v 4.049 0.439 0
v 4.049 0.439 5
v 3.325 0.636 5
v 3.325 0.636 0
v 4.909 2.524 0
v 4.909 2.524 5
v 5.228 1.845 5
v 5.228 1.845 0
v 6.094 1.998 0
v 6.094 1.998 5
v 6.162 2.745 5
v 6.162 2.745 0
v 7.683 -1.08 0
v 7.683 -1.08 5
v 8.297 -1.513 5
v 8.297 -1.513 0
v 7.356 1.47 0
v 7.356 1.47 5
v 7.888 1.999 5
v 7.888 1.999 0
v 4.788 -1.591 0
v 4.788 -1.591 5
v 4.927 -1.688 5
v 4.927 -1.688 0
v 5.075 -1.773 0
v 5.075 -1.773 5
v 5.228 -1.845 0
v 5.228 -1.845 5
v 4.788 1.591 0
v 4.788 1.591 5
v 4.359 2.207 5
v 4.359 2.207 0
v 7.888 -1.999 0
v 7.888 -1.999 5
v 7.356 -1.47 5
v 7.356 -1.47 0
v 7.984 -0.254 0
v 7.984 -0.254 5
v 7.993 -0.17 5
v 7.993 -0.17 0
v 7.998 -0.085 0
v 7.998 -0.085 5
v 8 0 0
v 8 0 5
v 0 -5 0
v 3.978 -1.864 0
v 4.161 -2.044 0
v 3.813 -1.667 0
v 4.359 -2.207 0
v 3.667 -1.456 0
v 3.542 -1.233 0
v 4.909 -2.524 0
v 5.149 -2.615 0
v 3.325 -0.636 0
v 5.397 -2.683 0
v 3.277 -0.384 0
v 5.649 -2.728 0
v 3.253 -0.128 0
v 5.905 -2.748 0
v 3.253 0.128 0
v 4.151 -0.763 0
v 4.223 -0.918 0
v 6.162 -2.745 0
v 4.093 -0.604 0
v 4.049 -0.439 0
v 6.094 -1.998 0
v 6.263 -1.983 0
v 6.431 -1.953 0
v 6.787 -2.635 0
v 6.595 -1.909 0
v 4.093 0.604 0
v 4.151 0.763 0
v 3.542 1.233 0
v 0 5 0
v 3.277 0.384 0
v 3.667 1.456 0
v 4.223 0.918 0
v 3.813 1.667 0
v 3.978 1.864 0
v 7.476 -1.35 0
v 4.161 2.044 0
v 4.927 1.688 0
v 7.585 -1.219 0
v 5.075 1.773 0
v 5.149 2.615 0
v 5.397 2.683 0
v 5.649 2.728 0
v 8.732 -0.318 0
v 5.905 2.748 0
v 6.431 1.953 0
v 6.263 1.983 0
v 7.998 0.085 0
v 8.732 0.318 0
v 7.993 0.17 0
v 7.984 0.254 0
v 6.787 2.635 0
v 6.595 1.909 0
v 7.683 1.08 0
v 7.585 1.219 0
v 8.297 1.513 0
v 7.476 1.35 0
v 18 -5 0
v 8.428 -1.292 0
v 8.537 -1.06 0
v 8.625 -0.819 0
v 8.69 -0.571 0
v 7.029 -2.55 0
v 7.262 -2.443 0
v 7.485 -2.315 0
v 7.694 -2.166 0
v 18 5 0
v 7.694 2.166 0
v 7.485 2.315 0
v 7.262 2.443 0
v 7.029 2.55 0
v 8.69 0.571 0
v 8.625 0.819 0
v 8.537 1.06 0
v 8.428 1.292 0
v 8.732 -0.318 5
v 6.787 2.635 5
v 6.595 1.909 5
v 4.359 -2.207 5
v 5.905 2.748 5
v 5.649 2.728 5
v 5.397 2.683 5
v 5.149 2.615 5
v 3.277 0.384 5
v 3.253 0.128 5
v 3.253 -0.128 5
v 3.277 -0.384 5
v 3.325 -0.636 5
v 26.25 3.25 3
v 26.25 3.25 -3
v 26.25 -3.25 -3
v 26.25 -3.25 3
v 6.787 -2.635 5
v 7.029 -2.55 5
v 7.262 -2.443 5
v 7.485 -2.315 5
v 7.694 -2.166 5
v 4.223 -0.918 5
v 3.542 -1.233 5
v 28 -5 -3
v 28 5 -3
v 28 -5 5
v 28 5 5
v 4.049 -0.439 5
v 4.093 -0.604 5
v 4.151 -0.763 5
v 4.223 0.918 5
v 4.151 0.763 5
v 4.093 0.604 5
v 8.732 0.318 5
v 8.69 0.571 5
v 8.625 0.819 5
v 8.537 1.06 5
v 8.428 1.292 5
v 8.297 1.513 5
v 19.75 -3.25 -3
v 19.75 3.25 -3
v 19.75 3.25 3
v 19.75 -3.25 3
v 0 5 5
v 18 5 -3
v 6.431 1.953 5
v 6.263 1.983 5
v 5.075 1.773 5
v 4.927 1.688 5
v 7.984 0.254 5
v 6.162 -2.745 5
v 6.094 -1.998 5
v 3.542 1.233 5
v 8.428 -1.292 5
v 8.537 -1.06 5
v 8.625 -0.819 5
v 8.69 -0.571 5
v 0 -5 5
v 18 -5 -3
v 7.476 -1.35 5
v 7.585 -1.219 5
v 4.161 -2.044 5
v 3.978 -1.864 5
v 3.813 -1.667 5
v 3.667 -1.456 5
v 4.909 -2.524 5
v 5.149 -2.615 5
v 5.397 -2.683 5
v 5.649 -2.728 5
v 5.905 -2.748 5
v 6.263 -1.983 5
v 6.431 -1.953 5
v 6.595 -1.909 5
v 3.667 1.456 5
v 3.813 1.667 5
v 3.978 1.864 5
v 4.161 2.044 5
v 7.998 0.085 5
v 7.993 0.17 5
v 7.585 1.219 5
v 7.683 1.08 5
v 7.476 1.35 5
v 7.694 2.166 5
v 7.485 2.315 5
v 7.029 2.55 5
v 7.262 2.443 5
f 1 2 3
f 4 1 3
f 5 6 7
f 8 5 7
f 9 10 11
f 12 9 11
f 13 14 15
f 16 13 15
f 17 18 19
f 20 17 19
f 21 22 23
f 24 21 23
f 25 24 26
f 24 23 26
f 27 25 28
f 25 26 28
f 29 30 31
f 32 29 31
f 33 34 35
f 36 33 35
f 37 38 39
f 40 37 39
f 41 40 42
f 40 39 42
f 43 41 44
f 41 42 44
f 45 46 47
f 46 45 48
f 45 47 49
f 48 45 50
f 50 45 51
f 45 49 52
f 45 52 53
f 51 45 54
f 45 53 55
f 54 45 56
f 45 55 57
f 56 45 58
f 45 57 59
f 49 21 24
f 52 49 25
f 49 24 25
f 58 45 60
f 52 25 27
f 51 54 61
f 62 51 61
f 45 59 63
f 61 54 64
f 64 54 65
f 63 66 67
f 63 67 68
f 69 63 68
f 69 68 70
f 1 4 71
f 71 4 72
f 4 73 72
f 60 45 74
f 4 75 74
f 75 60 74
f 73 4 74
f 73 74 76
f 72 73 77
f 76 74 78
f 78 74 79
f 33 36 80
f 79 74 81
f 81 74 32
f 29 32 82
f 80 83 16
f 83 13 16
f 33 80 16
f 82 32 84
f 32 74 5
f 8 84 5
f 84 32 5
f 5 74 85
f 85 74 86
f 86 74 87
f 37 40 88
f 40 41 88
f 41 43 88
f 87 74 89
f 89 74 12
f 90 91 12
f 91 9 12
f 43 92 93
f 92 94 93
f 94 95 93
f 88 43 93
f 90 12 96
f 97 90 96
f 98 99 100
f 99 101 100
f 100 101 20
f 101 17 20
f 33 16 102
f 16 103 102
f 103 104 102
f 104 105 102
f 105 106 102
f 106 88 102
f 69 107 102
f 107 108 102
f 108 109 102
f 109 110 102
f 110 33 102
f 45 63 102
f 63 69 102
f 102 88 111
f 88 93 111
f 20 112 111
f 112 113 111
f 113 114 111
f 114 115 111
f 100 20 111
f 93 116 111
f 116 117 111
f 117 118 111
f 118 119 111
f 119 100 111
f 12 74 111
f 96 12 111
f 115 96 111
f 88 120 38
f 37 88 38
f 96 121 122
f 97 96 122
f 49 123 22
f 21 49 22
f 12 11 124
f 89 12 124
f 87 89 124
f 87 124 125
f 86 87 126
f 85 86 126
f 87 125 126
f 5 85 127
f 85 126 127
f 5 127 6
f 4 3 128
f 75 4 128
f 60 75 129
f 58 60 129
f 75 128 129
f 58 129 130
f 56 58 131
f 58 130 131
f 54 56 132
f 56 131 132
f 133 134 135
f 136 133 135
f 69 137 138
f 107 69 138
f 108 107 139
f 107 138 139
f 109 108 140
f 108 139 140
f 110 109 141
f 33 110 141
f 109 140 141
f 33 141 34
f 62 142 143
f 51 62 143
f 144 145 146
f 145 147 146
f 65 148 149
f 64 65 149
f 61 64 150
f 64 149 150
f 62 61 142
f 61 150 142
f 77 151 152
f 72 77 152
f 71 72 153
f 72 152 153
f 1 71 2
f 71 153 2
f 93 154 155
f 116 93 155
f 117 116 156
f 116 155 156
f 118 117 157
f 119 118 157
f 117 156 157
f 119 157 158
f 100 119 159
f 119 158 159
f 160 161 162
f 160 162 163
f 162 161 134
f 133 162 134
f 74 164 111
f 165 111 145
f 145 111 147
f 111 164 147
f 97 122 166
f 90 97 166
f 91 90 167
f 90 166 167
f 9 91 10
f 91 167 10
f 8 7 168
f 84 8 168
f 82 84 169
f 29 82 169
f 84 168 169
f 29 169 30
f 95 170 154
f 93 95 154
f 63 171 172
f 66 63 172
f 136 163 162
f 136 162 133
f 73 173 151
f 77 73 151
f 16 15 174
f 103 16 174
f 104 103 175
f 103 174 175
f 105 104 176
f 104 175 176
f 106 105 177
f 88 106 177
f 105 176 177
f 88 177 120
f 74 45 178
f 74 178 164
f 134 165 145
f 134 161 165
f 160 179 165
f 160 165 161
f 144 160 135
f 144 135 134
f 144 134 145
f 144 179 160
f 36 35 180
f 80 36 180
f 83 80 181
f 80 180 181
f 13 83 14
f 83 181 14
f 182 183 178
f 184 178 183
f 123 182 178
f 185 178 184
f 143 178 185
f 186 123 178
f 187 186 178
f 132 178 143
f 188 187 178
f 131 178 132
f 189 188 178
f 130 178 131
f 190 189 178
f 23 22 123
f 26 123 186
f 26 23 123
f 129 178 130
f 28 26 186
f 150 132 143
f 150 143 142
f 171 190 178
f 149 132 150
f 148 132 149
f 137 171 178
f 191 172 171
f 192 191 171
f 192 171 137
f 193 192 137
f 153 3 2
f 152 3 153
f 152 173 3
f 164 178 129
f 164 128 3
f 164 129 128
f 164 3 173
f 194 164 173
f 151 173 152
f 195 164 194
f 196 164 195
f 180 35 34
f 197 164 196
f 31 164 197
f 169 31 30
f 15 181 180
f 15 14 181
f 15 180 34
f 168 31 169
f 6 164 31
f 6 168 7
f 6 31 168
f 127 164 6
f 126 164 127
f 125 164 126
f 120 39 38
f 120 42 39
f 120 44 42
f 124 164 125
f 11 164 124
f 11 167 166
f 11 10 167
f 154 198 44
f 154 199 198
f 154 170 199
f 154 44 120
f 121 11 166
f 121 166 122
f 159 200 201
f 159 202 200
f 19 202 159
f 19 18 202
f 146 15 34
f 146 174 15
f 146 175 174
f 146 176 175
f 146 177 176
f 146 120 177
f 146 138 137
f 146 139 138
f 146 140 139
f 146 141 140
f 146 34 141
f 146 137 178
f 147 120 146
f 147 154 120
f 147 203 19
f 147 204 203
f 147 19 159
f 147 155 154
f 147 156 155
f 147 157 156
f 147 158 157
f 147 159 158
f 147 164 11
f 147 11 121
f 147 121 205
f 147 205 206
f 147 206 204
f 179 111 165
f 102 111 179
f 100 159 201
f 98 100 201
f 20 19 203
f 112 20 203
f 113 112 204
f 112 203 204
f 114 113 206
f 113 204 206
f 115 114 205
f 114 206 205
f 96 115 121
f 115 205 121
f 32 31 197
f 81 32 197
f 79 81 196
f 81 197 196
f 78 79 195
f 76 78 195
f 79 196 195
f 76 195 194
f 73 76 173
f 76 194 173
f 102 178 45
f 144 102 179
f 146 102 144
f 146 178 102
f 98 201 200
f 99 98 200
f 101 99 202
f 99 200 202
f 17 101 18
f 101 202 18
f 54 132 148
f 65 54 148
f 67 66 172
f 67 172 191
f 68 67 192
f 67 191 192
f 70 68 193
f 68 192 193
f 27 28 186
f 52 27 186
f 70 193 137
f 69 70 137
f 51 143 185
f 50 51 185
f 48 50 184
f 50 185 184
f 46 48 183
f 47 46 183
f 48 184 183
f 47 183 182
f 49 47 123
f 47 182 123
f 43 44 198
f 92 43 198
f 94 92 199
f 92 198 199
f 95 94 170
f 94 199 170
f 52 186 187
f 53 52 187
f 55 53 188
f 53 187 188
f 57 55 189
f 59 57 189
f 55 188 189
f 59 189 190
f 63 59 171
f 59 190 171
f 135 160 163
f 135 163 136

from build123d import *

# Parameters (mm, degrees)
F0_W     = 28
F0_H     = 10
F1_DEPTH = 5
F3_DEPTH = 6
F4_W     = 10
F4_H     = 10
F5_DEPTH = 3
F6_W     = 6.5
F6_H     = 6.5
F7_DEPTH = 6


with BuildPart() as f1:
    # F0 (on Top) → F1 (new body)
    with BuildSketch(Plane.XY):
        with Locations((14, 0)):
            Rectangle(F0_W, F0_H)
    extrude(amount=F1_DEPTH)

    # F2 (on face) → F3 (cut)
    with BuildSketch(Plane.XY.offset(5)):
        with BuildLine():
            Line((7.9837568295, 0.2543793255), (8.7316052217, 0.3175419863))
            ThreePointArc((8.7316052217, 0.3175419863), (8.5841547072, 0.9405553941), (8.2966430552, 1.512590717))
            Line((8.2966430552, 1.512590717), (7.6831577744, 1.0802684419))
            ThreePointArc((7.6831577744, 1.0802684419), (7.8793852416, 0.6840402867), (7.9837568295, 0.2543793255))
        make_face()
        with BuildLine():
            Line((7.9837568295, -0.2543793255), (7.9837568295, 0.2543793255))
            ThreePointArc((7.9837568295, 0.2543793255), (7.8793852416, 0.6840402867), (7.6831577744, 1.0802684419))
            Line((7.6831577744, 1.0802684419), (7.3561340172, 1.4700001794))
            ThreePointArc((7.3561340172, 1.4700001794), (7, 1.7320508076), (6.5949904904, 1.9094465995))
            Line((6.5949904904, 1.9094465995), (6.0939610264, 1.9977916121))
            ThreePointArc((6.0939610264, 1.9977916121), (5.6527036447, 1.969615506), (5.2284205433, 1.8451734721))
            Line((5.2284205433, 1.8451734721), (4.7878226271, 1.5907941466))
            ThreePointArc((4.7878226271, 1.5907941466), (4.4679111138, 1.2855752194), (4.2228811992, 0.9175231702))
            Line((4.2228811992, 0.9175231702), (4.0488754925, 0.4394464201))
            ThreePointArc((4.0488754925, 0.4394464201), (4, 0), (4.0488754925, -0.4394464201))
            Line((4.0488754925, -0.4394464201), (4.2228811992, -0.9175231702))
            ThreePointArc((4.2228811992, -0.9175231702), (4.4679111138, -1.2855752194), (4.7878226271, -1.5907941466))
            Line((4.7878226271, -1.5907941466), (5.2284205433, -1.8451734721))
            ThreePointArc((5.2284205433, -1.8451734721), (5.6527036447, -1.969615506), (6.0939610264, -1.9977916121))
            Line((6.0939610264, -1.9977916121), (6.5949904904, -1.9094465995))
            ThreePointArc((6.5949904904, -1.9094465995), (7, -1.7320508076), (7.3561340172, -1.4700001794))
            Line((7.3561340172, -1.4700001794), (7.6831577744, -1.0802684419))
            ThreePointArc((7.6831577744, -1.0802684419), (7.8793852416, -0.6840402867), (7.9837568295, -0.2543793255))
        make_face()
        with BuildLine():
            ThreePointArc((8, 0), (7.9959350765, 0.1274486974), (7.9837568295, 0.2543793255))
            Line((7.9837568295, 0.2543793255), (7.9837568295, -0.2543793255))
            ThreePointArc((7.9837568295, -0.2543793255), (7.9959350765, -0.1274486974), (8, 0))
        make_face()
        with BuildLine():
            Line((7.3561340172, 1.4700001794), (7.6831577744, 1.0802684419))
            ThreePointArc((7.6831577744, 1.0802684419), (7.5320888862, 1.2855752194), (7.3561340172, 1.4700001794))
        make_face()
        with BuildLine():
            Line((8.7316052217, -0.3175419863), (7.9837568295, -0.2543793255))
            ThreePointArc((7.9837568295, -0.2543793255), (7.8793852416, -0.6840402867), (7.6831577744, -1.0802684419))
            Line((7.6831577744, -1.0802684419), (8.2966430552, -1.512590717))
            ThreePointArc((8.2966430552, -1.512590717), (8.5841547072, -0.9405553941), (8.7316052217, -0.3175419863))
        make_face()
        with BuildLine():
            ThreePointArc((6.5949904904, 1.9094465995), (7, 1.7320508076), (7.3561340172, 1.4700001794))
            Line((7.3561340172, 1.4700001794), (7.8884189465, 1.9990932651))
            ThreePointArc((7.8884189465, 1.9990932651), (7.375, 2.3815698604), (6.7870560788, 2.6349654132))
            Line((6.7870560788, 2.6349654132), (6.5949904904, 1.9094465995))
        make_face()
        with BuildLine():
            ThreePointArc((7.3561340172, -1.4700001794), (7.5320888862, -1.2855752194), (7.6831577744, -1.0802684419))
            Line((7.6831577744, -1.0802684419), (7.3561340172, -1.4700001794))
        make_face()
        with BuildLine():
            Line((6.0939610264, 1.9977916121), (6.5949904904, 1.9094465995))
            ThreePointArc((6.5949904904, 1.9094465995), (6.3472963553, 1.969615506), (6.0939610264, 1.9977916121))
        make_face()
        with BuildLine():
            Line((7.8884189465, -1.9990932651), (7.3561340172, -1.4700001794))
            ThreePointArc((7.3561340172, -1.4700001794), (7, -1.7320508076), (6.5949904904, -1.9094465995))
            Line((6.5949904904, -1.9094465995), (6.7870560788, -2.6349654132))
            ThreePointArc((6.7870560788, -2.6349654132), (7.375, -2.3815698604), (7.8884189465, -1.9990932651))
        make_face()
        with BuildLine():
            ThreePointArc((5.2284205433, 1.8451734721), (5.6527036447, 1.969615506), (6.0939610264, 1.9977916121))
            Line((6.0939610264, 1.9977916121), (6.1616204589, 2.7452465877))
            ThreePointArc((6.1616204589, 2.7452465877), (5.5224675114, 2.7082213208), (4.9091968161, 2.5244105082))
            Line((4.9091968161, 2.5244105082), (5.2284205433, 1.8451734721))
        make_face()
        with BuildLine():
            ThreePointArc((6.0939610264, -1.9977916121), (6.3472963553, -1.969615506), (6.5949904904, -1.9094465995))
            Line((6.5949904904, -1.9094465995), (6.0939610264, -1.9977916121))
        make_face()
        with BuildLine():
            Line((4.7878226271, 1.5907941466), (5.2284205433, 1.8451734721))
            ThreePointArc((5.2284205433, 1.8451734721), (5, 1.7320508076), (4.7878226271, 1.5907941466))
        make_face()
        with BuildLine():
            Line((6.1616204589, -2.7452465877), (6.0939610264, -1.9977916121))
            ThreePointArc((6.0939610264, -1.9977916121), (5.6527036447, -1.969615506), (5.2284205433, -1.8451734721))
            Line((5.2284205433, -1.8451734721), (4.9091968161, -2.5244105082))
            ThreePointArc((4.9091968161, -2.5244105082), (5.5224675114, -2.7082213208), (6.1616204589, -2.7452465877))
        make_face()
        with BuildLine():
            ThreePointArc((4.2228811992, 0.9175231702), (4.4679111138, 1.2855752194), (4.7878226271, 1.5907941466))
            Line((4.7878226271, 1.5907941466), (4.3591979623, 2.2068685219))
            ThreePointArc((4.3591979623, 2.2068685219), (3.8933777814, 1.7676659266), (3.541736486, 1.2326558707))
            Line((3.541736486, 1.2326558707), (4.2228811992, 0.9175231702))
        make_face()
        with BuildLine():
            ThreePointArc((4.7878226271, -1.5907941466), (5, -1.7320508076), (5.2284205433, -1.8451734721))
            Line((5.2284205433, -1.8451734721), (4.7878226271, -1.5907941466))
        make_face()
        with BuildLine():
            Line((4.0488754925, 0.4394464201), (4.2228811992, 0.9175231702))
            ThreePointArc((4.2228811992, 0.9175231702), (4.1206147584, 0.6840402867), (4.0488754925, 0.4394464201))
        make_face()
        with BuildLine():
            Line((4.3591979623, -2.2068685219), (4.7878226271, -1.5907941466))
            ThreePointArc((4.7878226271, -1.5907941466), (4.4679111138, -1.2855752194), (4.2228811992, -0.9175231702))
            Line((4.2228811992, -0.9175231702), (3.541736486, -1.2326558707))
            ThreePointArc((3.541736486, -1.2326558707), (3.8933777814, -1.7676659266), (4.3591979623, -2.2068685219))
        make_face()
        with BuildLine():
            ThreePointArc((4.0488754925, -0.4394464201), (4, 0), (4.0488754925, 0.4394464201))
            Line((4.0488754925, 0.4394464201), (3.3245249747, 0.6358721481))
            ThreePointArc((3.3245249747, 0.6358721481), (3.25, 0), (3.3245249747, -0.6358721481))
            Line((3.3245249747, -0.6358721481), (4.0488754925, -0.4394464201))
        make_face()
        with BuildLine():
            ThreePointArc((4.0488754925, -0.4394464201), (4.1206147584, -0.6840402867), (4.2228811992, -0.9175231702))
            Line((4.2228811992, -0.9175231702), (4.0488754925, -0.4394464201))
        make_face()
    extrude(amount=-F3_DEPTH, mode=Mode.SUBTRACT)

    # F4 (on face) → F5 (join)
    with BuildSketch(Plane(origin=(0, 0, 0), x_dir=(1, 0, 0), z_dir=(0, 0, -1))):
        with Locations((23, 0)):
            Rectangle(F4_W, F4_H)
    extrude(amount=F5_DEPTH)

    # F6 (on face) → F7 (cut)
    with BuildSketch(Plane(origin=(0, 0, -3), x_dir=(1, 0, 0), z_dir=(0, 0, -1))):
        with Locations((23, 0)):
            Rectangle(F6_W, F6_H)
    extrude(amount=-F7_DEPTH, mode=Mode.SUBTRACT)


solid = f1.part
